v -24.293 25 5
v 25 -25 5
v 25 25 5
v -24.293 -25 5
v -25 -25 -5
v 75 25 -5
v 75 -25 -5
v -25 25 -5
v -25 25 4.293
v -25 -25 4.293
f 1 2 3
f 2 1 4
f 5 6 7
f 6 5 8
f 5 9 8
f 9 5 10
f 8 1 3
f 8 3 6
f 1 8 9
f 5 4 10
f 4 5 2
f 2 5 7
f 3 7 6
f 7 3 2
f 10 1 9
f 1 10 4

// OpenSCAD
chamfer = 1;

// Charger tray with wedge
module charger_tray(height, width, tray_length, wedge_length) {
    difference() {
        union() {
            // Main charger tray body
            cube([tray_length, width, height], center=true);
            
            // Wedge
            translate([tray_length/2, 0, -height/2])
            rotate([90, 0, 0])
            wedge(wedge_length, width, height);
        }
        
        // Chamfered edge on the side opposite the wedge
        translate([-tray_length/2, 0, height/2])
        rotate([0, 45, 0])
        cube([chamfer, width, chamfer], center=true);
    }
}

// Wedge for the charger tray
module wedge(length, width, height) {
    linear_extrude(height = width, center = true)
    polygon([
        [0, height],
        [length, 0],
        [0, 0],
    ]);
}

charger_tray(10, 50, 50, 50);
